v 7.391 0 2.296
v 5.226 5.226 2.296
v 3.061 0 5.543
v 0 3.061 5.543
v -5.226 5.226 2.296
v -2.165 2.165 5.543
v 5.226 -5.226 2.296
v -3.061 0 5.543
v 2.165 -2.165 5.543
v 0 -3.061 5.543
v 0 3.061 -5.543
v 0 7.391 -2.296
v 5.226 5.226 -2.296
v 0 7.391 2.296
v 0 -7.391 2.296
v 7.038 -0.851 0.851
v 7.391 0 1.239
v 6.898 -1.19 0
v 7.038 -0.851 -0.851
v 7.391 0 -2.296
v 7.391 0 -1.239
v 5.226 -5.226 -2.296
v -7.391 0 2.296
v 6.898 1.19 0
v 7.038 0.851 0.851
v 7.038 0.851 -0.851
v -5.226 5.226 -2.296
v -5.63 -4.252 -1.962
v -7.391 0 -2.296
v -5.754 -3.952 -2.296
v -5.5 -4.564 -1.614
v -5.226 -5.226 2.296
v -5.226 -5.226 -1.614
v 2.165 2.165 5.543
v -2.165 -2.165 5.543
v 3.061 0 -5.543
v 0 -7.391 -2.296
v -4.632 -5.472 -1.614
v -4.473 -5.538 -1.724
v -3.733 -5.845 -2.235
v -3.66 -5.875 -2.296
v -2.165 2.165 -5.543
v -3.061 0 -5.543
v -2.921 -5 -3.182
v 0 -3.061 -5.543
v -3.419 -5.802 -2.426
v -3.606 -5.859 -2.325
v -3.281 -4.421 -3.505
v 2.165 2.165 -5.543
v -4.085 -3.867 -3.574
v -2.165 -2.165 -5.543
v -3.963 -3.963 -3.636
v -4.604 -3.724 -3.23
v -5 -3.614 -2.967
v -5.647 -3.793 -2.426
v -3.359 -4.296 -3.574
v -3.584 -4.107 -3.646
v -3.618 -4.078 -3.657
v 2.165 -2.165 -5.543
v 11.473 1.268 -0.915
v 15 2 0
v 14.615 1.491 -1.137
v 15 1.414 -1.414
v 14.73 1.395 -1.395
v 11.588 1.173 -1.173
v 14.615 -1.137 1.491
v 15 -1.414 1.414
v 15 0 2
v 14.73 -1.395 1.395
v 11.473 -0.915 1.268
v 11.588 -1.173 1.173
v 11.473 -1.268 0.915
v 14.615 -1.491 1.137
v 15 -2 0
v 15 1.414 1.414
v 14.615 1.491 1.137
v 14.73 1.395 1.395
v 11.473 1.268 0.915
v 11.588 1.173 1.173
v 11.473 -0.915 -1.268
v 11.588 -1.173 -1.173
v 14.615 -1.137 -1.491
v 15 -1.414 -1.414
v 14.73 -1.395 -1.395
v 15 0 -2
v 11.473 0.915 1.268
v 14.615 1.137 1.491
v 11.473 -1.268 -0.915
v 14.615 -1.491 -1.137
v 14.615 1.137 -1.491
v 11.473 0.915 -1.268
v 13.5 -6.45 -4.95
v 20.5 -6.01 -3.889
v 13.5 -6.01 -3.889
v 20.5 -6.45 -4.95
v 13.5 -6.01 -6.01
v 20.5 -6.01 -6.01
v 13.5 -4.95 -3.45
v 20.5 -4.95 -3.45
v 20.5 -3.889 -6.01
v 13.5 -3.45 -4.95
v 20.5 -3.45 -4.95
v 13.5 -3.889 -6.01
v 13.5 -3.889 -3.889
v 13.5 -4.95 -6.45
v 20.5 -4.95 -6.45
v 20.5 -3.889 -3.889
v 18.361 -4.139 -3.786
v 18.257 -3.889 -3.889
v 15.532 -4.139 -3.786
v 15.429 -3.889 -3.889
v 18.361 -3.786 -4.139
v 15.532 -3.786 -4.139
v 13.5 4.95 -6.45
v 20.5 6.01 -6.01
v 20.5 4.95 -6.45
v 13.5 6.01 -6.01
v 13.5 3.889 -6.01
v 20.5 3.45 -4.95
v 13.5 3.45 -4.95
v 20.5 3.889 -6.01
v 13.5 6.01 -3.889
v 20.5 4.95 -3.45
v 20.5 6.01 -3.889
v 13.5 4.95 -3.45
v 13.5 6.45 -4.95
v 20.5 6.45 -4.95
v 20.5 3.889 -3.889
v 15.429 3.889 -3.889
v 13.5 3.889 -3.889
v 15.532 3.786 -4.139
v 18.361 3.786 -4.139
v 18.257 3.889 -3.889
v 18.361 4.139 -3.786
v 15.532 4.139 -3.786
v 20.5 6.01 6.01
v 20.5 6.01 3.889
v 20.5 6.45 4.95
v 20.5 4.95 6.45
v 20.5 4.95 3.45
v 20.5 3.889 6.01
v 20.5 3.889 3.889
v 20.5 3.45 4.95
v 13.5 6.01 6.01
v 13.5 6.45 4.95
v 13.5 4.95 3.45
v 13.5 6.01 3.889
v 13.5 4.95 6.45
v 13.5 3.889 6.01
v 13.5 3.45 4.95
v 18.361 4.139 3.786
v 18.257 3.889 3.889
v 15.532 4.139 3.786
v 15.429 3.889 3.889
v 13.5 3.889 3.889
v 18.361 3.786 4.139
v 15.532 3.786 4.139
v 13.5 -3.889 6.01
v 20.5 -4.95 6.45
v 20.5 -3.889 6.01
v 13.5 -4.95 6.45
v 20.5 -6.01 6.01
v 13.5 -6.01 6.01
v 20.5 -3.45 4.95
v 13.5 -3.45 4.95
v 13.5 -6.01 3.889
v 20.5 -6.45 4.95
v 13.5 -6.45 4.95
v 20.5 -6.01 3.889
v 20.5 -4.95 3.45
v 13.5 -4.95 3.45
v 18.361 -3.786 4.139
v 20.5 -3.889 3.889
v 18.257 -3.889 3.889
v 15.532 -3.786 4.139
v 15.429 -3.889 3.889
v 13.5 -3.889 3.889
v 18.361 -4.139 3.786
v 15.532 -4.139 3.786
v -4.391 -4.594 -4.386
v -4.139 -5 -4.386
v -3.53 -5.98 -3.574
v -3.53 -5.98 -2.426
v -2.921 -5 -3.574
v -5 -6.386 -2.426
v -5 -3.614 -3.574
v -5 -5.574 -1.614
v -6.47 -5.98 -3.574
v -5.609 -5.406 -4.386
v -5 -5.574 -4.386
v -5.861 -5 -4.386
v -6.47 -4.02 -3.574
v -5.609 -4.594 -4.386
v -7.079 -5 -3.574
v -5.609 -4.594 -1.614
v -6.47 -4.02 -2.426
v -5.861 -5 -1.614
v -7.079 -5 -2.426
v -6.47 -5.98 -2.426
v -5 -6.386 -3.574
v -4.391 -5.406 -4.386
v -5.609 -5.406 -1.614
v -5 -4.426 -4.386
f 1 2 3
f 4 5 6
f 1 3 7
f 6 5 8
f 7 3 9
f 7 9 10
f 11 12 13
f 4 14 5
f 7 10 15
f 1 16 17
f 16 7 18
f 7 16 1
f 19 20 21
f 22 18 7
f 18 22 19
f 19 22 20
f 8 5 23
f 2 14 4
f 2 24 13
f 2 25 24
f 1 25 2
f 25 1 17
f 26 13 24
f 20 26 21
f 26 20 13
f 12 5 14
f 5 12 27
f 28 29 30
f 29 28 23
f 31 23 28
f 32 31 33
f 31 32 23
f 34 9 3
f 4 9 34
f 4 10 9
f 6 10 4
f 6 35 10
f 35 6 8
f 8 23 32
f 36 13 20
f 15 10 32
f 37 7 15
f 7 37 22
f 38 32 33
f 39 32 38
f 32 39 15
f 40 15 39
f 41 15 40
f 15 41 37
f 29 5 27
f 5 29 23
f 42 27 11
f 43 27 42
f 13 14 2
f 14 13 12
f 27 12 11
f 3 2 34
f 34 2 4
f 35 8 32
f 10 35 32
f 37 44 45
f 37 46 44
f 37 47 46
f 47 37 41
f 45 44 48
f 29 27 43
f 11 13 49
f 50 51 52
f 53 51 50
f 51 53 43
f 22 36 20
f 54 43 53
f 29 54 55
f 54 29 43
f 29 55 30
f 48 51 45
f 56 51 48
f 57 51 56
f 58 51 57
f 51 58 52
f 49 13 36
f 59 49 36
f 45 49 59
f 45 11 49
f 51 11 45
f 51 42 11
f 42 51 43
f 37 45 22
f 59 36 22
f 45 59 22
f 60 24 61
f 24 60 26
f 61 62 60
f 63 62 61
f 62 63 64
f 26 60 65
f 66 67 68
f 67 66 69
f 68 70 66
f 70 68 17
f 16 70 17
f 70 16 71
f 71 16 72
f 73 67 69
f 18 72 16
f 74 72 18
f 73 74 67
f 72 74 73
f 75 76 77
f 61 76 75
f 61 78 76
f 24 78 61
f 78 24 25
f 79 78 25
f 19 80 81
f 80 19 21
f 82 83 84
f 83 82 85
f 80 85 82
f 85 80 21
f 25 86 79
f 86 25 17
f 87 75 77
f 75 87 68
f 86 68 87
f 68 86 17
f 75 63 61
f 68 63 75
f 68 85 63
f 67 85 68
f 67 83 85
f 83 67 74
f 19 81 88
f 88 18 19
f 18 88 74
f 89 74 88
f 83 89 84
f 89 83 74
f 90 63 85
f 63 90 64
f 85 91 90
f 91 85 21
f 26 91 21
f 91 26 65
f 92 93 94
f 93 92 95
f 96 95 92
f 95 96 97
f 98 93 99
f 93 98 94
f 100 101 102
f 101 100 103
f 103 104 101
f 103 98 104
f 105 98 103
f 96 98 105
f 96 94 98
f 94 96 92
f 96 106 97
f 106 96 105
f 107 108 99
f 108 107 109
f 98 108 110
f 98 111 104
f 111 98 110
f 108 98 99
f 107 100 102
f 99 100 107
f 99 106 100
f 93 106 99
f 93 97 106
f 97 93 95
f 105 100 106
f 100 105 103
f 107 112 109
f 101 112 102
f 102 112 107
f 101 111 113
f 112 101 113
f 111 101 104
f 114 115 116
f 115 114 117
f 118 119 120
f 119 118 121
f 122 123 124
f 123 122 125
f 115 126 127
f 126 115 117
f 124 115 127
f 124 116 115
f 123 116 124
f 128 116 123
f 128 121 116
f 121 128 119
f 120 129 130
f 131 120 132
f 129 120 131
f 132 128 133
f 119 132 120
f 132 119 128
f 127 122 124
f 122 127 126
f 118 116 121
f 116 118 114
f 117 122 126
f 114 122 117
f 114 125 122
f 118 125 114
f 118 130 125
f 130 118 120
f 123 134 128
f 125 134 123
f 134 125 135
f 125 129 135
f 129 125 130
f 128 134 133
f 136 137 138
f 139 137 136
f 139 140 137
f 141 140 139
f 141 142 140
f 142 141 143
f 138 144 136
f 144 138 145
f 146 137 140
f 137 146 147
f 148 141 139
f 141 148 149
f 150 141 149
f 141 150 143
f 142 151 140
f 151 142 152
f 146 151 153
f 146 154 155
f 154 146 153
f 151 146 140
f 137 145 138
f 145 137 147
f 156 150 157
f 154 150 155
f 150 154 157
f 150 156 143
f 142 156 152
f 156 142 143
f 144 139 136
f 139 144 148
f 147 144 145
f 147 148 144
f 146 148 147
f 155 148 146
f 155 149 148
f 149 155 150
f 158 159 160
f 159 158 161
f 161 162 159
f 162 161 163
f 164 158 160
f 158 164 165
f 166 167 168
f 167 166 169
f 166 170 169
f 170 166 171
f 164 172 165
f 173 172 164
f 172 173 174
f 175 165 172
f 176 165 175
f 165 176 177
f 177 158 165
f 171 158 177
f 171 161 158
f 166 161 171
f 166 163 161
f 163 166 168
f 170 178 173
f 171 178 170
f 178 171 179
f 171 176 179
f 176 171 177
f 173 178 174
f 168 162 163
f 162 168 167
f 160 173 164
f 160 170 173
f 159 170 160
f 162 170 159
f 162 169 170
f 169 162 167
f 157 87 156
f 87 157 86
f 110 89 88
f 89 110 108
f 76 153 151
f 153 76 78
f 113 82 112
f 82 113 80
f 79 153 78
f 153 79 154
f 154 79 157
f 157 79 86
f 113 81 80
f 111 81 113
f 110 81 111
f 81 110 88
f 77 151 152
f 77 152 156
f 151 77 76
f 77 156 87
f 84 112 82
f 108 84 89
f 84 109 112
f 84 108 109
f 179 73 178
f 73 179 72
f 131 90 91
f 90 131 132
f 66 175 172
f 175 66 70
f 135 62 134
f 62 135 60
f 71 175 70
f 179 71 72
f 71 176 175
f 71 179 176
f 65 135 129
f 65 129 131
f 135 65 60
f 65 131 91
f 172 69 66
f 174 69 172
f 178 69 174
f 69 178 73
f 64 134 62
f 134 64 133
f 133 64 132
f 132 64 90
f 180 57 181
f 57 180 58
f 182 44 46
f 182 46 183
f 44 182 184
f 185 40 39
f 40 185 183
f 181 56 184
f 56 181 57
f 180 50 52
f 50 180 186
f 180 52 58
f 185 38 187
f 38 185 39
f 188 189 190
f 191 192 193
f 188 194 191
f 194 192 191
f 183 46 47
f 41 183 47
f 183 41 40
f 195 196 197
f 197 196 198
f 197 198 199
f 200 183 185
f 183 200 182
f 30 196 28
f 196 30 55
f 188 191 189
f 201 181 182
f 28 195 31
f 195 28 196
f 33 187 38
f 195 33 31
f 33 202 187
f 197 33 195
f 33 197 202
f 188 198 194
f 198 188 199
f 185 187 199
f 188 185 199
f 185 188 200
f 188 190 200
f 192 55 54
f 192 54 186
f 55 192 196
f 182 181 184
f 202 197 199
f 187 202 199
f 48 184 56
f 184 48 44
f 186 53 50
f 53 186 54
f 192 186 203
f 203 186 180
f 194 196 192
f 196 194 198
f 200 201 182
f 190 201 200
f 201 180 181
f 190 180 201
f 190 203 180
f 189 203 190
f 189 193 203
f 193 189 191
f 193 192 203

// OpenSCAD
module fin()
{
	rotate(a = 45, v = [0, 0, 1])
		difference() {
			cube(size = [10, 10, 0.5], center = true);
			translate(v = [2, 2, 0])
				cube(size = [10, 10, 2], center = true);
		}
}

module fin_pair()
{
	union() {
		fin();
		rotate(a = 90, v = [0, 1, 0])
			fin();
	}
}

module outrigger()
{
	rotate(a = 90, v = [1, 0, 0])
		cylinder(h = 7, r1 = 1.5, r2 = 1.5, center = true);
}

module outrigger_set()
{
	translate(v = [7, 0, 0])
		outrigger();
	rotate(a = 90, v = [0, 1, 0])
		translate(v = [7, 0, 0])
			outrigger();
	rotate(a = 180, v = [0, 1, 0])
		translate(v = [7, 0, 0])
			outrigger();
	rotate(a = 270, v = [0, 1, 0])
		translate(v = [7, 0, 0])
			outrigger();
}
	
module fins_plus_outriggers()
{
	union() {
		outrigger_set();
		fin_pair();
	}
}

module main_ball()
{
	scale(v = [1, 1, 0.75])
		sphere(r = 8);
}

module fuselage()
{
	translate(v = [0, 10, 0])
		rotate(a = 90, v = [1, 0, 0])
			cylinder(h = 10, r1 = 2, r2 = 1, center = true);
}

module ball_plus_fuselage()
{
	union() {
		main_ball();
		fuselage();
	}
}

module little_pod()
{
	scale(v = [1, 1.5, 1])
		sphere(r = 1.5);
}

module ship()
{
	rotate(a = -90, v = [0, 0, 1])
	union() {
		ball_plus_fuselage();
		rotate(a = 45, v = [0, 1, 0])
			translate(v = [0, 17, 0])
				fins_plus_outriggers();
		translate(v = [5, -5, -3])
			little_pod();
	}
}

$fn = 8;
ship();
